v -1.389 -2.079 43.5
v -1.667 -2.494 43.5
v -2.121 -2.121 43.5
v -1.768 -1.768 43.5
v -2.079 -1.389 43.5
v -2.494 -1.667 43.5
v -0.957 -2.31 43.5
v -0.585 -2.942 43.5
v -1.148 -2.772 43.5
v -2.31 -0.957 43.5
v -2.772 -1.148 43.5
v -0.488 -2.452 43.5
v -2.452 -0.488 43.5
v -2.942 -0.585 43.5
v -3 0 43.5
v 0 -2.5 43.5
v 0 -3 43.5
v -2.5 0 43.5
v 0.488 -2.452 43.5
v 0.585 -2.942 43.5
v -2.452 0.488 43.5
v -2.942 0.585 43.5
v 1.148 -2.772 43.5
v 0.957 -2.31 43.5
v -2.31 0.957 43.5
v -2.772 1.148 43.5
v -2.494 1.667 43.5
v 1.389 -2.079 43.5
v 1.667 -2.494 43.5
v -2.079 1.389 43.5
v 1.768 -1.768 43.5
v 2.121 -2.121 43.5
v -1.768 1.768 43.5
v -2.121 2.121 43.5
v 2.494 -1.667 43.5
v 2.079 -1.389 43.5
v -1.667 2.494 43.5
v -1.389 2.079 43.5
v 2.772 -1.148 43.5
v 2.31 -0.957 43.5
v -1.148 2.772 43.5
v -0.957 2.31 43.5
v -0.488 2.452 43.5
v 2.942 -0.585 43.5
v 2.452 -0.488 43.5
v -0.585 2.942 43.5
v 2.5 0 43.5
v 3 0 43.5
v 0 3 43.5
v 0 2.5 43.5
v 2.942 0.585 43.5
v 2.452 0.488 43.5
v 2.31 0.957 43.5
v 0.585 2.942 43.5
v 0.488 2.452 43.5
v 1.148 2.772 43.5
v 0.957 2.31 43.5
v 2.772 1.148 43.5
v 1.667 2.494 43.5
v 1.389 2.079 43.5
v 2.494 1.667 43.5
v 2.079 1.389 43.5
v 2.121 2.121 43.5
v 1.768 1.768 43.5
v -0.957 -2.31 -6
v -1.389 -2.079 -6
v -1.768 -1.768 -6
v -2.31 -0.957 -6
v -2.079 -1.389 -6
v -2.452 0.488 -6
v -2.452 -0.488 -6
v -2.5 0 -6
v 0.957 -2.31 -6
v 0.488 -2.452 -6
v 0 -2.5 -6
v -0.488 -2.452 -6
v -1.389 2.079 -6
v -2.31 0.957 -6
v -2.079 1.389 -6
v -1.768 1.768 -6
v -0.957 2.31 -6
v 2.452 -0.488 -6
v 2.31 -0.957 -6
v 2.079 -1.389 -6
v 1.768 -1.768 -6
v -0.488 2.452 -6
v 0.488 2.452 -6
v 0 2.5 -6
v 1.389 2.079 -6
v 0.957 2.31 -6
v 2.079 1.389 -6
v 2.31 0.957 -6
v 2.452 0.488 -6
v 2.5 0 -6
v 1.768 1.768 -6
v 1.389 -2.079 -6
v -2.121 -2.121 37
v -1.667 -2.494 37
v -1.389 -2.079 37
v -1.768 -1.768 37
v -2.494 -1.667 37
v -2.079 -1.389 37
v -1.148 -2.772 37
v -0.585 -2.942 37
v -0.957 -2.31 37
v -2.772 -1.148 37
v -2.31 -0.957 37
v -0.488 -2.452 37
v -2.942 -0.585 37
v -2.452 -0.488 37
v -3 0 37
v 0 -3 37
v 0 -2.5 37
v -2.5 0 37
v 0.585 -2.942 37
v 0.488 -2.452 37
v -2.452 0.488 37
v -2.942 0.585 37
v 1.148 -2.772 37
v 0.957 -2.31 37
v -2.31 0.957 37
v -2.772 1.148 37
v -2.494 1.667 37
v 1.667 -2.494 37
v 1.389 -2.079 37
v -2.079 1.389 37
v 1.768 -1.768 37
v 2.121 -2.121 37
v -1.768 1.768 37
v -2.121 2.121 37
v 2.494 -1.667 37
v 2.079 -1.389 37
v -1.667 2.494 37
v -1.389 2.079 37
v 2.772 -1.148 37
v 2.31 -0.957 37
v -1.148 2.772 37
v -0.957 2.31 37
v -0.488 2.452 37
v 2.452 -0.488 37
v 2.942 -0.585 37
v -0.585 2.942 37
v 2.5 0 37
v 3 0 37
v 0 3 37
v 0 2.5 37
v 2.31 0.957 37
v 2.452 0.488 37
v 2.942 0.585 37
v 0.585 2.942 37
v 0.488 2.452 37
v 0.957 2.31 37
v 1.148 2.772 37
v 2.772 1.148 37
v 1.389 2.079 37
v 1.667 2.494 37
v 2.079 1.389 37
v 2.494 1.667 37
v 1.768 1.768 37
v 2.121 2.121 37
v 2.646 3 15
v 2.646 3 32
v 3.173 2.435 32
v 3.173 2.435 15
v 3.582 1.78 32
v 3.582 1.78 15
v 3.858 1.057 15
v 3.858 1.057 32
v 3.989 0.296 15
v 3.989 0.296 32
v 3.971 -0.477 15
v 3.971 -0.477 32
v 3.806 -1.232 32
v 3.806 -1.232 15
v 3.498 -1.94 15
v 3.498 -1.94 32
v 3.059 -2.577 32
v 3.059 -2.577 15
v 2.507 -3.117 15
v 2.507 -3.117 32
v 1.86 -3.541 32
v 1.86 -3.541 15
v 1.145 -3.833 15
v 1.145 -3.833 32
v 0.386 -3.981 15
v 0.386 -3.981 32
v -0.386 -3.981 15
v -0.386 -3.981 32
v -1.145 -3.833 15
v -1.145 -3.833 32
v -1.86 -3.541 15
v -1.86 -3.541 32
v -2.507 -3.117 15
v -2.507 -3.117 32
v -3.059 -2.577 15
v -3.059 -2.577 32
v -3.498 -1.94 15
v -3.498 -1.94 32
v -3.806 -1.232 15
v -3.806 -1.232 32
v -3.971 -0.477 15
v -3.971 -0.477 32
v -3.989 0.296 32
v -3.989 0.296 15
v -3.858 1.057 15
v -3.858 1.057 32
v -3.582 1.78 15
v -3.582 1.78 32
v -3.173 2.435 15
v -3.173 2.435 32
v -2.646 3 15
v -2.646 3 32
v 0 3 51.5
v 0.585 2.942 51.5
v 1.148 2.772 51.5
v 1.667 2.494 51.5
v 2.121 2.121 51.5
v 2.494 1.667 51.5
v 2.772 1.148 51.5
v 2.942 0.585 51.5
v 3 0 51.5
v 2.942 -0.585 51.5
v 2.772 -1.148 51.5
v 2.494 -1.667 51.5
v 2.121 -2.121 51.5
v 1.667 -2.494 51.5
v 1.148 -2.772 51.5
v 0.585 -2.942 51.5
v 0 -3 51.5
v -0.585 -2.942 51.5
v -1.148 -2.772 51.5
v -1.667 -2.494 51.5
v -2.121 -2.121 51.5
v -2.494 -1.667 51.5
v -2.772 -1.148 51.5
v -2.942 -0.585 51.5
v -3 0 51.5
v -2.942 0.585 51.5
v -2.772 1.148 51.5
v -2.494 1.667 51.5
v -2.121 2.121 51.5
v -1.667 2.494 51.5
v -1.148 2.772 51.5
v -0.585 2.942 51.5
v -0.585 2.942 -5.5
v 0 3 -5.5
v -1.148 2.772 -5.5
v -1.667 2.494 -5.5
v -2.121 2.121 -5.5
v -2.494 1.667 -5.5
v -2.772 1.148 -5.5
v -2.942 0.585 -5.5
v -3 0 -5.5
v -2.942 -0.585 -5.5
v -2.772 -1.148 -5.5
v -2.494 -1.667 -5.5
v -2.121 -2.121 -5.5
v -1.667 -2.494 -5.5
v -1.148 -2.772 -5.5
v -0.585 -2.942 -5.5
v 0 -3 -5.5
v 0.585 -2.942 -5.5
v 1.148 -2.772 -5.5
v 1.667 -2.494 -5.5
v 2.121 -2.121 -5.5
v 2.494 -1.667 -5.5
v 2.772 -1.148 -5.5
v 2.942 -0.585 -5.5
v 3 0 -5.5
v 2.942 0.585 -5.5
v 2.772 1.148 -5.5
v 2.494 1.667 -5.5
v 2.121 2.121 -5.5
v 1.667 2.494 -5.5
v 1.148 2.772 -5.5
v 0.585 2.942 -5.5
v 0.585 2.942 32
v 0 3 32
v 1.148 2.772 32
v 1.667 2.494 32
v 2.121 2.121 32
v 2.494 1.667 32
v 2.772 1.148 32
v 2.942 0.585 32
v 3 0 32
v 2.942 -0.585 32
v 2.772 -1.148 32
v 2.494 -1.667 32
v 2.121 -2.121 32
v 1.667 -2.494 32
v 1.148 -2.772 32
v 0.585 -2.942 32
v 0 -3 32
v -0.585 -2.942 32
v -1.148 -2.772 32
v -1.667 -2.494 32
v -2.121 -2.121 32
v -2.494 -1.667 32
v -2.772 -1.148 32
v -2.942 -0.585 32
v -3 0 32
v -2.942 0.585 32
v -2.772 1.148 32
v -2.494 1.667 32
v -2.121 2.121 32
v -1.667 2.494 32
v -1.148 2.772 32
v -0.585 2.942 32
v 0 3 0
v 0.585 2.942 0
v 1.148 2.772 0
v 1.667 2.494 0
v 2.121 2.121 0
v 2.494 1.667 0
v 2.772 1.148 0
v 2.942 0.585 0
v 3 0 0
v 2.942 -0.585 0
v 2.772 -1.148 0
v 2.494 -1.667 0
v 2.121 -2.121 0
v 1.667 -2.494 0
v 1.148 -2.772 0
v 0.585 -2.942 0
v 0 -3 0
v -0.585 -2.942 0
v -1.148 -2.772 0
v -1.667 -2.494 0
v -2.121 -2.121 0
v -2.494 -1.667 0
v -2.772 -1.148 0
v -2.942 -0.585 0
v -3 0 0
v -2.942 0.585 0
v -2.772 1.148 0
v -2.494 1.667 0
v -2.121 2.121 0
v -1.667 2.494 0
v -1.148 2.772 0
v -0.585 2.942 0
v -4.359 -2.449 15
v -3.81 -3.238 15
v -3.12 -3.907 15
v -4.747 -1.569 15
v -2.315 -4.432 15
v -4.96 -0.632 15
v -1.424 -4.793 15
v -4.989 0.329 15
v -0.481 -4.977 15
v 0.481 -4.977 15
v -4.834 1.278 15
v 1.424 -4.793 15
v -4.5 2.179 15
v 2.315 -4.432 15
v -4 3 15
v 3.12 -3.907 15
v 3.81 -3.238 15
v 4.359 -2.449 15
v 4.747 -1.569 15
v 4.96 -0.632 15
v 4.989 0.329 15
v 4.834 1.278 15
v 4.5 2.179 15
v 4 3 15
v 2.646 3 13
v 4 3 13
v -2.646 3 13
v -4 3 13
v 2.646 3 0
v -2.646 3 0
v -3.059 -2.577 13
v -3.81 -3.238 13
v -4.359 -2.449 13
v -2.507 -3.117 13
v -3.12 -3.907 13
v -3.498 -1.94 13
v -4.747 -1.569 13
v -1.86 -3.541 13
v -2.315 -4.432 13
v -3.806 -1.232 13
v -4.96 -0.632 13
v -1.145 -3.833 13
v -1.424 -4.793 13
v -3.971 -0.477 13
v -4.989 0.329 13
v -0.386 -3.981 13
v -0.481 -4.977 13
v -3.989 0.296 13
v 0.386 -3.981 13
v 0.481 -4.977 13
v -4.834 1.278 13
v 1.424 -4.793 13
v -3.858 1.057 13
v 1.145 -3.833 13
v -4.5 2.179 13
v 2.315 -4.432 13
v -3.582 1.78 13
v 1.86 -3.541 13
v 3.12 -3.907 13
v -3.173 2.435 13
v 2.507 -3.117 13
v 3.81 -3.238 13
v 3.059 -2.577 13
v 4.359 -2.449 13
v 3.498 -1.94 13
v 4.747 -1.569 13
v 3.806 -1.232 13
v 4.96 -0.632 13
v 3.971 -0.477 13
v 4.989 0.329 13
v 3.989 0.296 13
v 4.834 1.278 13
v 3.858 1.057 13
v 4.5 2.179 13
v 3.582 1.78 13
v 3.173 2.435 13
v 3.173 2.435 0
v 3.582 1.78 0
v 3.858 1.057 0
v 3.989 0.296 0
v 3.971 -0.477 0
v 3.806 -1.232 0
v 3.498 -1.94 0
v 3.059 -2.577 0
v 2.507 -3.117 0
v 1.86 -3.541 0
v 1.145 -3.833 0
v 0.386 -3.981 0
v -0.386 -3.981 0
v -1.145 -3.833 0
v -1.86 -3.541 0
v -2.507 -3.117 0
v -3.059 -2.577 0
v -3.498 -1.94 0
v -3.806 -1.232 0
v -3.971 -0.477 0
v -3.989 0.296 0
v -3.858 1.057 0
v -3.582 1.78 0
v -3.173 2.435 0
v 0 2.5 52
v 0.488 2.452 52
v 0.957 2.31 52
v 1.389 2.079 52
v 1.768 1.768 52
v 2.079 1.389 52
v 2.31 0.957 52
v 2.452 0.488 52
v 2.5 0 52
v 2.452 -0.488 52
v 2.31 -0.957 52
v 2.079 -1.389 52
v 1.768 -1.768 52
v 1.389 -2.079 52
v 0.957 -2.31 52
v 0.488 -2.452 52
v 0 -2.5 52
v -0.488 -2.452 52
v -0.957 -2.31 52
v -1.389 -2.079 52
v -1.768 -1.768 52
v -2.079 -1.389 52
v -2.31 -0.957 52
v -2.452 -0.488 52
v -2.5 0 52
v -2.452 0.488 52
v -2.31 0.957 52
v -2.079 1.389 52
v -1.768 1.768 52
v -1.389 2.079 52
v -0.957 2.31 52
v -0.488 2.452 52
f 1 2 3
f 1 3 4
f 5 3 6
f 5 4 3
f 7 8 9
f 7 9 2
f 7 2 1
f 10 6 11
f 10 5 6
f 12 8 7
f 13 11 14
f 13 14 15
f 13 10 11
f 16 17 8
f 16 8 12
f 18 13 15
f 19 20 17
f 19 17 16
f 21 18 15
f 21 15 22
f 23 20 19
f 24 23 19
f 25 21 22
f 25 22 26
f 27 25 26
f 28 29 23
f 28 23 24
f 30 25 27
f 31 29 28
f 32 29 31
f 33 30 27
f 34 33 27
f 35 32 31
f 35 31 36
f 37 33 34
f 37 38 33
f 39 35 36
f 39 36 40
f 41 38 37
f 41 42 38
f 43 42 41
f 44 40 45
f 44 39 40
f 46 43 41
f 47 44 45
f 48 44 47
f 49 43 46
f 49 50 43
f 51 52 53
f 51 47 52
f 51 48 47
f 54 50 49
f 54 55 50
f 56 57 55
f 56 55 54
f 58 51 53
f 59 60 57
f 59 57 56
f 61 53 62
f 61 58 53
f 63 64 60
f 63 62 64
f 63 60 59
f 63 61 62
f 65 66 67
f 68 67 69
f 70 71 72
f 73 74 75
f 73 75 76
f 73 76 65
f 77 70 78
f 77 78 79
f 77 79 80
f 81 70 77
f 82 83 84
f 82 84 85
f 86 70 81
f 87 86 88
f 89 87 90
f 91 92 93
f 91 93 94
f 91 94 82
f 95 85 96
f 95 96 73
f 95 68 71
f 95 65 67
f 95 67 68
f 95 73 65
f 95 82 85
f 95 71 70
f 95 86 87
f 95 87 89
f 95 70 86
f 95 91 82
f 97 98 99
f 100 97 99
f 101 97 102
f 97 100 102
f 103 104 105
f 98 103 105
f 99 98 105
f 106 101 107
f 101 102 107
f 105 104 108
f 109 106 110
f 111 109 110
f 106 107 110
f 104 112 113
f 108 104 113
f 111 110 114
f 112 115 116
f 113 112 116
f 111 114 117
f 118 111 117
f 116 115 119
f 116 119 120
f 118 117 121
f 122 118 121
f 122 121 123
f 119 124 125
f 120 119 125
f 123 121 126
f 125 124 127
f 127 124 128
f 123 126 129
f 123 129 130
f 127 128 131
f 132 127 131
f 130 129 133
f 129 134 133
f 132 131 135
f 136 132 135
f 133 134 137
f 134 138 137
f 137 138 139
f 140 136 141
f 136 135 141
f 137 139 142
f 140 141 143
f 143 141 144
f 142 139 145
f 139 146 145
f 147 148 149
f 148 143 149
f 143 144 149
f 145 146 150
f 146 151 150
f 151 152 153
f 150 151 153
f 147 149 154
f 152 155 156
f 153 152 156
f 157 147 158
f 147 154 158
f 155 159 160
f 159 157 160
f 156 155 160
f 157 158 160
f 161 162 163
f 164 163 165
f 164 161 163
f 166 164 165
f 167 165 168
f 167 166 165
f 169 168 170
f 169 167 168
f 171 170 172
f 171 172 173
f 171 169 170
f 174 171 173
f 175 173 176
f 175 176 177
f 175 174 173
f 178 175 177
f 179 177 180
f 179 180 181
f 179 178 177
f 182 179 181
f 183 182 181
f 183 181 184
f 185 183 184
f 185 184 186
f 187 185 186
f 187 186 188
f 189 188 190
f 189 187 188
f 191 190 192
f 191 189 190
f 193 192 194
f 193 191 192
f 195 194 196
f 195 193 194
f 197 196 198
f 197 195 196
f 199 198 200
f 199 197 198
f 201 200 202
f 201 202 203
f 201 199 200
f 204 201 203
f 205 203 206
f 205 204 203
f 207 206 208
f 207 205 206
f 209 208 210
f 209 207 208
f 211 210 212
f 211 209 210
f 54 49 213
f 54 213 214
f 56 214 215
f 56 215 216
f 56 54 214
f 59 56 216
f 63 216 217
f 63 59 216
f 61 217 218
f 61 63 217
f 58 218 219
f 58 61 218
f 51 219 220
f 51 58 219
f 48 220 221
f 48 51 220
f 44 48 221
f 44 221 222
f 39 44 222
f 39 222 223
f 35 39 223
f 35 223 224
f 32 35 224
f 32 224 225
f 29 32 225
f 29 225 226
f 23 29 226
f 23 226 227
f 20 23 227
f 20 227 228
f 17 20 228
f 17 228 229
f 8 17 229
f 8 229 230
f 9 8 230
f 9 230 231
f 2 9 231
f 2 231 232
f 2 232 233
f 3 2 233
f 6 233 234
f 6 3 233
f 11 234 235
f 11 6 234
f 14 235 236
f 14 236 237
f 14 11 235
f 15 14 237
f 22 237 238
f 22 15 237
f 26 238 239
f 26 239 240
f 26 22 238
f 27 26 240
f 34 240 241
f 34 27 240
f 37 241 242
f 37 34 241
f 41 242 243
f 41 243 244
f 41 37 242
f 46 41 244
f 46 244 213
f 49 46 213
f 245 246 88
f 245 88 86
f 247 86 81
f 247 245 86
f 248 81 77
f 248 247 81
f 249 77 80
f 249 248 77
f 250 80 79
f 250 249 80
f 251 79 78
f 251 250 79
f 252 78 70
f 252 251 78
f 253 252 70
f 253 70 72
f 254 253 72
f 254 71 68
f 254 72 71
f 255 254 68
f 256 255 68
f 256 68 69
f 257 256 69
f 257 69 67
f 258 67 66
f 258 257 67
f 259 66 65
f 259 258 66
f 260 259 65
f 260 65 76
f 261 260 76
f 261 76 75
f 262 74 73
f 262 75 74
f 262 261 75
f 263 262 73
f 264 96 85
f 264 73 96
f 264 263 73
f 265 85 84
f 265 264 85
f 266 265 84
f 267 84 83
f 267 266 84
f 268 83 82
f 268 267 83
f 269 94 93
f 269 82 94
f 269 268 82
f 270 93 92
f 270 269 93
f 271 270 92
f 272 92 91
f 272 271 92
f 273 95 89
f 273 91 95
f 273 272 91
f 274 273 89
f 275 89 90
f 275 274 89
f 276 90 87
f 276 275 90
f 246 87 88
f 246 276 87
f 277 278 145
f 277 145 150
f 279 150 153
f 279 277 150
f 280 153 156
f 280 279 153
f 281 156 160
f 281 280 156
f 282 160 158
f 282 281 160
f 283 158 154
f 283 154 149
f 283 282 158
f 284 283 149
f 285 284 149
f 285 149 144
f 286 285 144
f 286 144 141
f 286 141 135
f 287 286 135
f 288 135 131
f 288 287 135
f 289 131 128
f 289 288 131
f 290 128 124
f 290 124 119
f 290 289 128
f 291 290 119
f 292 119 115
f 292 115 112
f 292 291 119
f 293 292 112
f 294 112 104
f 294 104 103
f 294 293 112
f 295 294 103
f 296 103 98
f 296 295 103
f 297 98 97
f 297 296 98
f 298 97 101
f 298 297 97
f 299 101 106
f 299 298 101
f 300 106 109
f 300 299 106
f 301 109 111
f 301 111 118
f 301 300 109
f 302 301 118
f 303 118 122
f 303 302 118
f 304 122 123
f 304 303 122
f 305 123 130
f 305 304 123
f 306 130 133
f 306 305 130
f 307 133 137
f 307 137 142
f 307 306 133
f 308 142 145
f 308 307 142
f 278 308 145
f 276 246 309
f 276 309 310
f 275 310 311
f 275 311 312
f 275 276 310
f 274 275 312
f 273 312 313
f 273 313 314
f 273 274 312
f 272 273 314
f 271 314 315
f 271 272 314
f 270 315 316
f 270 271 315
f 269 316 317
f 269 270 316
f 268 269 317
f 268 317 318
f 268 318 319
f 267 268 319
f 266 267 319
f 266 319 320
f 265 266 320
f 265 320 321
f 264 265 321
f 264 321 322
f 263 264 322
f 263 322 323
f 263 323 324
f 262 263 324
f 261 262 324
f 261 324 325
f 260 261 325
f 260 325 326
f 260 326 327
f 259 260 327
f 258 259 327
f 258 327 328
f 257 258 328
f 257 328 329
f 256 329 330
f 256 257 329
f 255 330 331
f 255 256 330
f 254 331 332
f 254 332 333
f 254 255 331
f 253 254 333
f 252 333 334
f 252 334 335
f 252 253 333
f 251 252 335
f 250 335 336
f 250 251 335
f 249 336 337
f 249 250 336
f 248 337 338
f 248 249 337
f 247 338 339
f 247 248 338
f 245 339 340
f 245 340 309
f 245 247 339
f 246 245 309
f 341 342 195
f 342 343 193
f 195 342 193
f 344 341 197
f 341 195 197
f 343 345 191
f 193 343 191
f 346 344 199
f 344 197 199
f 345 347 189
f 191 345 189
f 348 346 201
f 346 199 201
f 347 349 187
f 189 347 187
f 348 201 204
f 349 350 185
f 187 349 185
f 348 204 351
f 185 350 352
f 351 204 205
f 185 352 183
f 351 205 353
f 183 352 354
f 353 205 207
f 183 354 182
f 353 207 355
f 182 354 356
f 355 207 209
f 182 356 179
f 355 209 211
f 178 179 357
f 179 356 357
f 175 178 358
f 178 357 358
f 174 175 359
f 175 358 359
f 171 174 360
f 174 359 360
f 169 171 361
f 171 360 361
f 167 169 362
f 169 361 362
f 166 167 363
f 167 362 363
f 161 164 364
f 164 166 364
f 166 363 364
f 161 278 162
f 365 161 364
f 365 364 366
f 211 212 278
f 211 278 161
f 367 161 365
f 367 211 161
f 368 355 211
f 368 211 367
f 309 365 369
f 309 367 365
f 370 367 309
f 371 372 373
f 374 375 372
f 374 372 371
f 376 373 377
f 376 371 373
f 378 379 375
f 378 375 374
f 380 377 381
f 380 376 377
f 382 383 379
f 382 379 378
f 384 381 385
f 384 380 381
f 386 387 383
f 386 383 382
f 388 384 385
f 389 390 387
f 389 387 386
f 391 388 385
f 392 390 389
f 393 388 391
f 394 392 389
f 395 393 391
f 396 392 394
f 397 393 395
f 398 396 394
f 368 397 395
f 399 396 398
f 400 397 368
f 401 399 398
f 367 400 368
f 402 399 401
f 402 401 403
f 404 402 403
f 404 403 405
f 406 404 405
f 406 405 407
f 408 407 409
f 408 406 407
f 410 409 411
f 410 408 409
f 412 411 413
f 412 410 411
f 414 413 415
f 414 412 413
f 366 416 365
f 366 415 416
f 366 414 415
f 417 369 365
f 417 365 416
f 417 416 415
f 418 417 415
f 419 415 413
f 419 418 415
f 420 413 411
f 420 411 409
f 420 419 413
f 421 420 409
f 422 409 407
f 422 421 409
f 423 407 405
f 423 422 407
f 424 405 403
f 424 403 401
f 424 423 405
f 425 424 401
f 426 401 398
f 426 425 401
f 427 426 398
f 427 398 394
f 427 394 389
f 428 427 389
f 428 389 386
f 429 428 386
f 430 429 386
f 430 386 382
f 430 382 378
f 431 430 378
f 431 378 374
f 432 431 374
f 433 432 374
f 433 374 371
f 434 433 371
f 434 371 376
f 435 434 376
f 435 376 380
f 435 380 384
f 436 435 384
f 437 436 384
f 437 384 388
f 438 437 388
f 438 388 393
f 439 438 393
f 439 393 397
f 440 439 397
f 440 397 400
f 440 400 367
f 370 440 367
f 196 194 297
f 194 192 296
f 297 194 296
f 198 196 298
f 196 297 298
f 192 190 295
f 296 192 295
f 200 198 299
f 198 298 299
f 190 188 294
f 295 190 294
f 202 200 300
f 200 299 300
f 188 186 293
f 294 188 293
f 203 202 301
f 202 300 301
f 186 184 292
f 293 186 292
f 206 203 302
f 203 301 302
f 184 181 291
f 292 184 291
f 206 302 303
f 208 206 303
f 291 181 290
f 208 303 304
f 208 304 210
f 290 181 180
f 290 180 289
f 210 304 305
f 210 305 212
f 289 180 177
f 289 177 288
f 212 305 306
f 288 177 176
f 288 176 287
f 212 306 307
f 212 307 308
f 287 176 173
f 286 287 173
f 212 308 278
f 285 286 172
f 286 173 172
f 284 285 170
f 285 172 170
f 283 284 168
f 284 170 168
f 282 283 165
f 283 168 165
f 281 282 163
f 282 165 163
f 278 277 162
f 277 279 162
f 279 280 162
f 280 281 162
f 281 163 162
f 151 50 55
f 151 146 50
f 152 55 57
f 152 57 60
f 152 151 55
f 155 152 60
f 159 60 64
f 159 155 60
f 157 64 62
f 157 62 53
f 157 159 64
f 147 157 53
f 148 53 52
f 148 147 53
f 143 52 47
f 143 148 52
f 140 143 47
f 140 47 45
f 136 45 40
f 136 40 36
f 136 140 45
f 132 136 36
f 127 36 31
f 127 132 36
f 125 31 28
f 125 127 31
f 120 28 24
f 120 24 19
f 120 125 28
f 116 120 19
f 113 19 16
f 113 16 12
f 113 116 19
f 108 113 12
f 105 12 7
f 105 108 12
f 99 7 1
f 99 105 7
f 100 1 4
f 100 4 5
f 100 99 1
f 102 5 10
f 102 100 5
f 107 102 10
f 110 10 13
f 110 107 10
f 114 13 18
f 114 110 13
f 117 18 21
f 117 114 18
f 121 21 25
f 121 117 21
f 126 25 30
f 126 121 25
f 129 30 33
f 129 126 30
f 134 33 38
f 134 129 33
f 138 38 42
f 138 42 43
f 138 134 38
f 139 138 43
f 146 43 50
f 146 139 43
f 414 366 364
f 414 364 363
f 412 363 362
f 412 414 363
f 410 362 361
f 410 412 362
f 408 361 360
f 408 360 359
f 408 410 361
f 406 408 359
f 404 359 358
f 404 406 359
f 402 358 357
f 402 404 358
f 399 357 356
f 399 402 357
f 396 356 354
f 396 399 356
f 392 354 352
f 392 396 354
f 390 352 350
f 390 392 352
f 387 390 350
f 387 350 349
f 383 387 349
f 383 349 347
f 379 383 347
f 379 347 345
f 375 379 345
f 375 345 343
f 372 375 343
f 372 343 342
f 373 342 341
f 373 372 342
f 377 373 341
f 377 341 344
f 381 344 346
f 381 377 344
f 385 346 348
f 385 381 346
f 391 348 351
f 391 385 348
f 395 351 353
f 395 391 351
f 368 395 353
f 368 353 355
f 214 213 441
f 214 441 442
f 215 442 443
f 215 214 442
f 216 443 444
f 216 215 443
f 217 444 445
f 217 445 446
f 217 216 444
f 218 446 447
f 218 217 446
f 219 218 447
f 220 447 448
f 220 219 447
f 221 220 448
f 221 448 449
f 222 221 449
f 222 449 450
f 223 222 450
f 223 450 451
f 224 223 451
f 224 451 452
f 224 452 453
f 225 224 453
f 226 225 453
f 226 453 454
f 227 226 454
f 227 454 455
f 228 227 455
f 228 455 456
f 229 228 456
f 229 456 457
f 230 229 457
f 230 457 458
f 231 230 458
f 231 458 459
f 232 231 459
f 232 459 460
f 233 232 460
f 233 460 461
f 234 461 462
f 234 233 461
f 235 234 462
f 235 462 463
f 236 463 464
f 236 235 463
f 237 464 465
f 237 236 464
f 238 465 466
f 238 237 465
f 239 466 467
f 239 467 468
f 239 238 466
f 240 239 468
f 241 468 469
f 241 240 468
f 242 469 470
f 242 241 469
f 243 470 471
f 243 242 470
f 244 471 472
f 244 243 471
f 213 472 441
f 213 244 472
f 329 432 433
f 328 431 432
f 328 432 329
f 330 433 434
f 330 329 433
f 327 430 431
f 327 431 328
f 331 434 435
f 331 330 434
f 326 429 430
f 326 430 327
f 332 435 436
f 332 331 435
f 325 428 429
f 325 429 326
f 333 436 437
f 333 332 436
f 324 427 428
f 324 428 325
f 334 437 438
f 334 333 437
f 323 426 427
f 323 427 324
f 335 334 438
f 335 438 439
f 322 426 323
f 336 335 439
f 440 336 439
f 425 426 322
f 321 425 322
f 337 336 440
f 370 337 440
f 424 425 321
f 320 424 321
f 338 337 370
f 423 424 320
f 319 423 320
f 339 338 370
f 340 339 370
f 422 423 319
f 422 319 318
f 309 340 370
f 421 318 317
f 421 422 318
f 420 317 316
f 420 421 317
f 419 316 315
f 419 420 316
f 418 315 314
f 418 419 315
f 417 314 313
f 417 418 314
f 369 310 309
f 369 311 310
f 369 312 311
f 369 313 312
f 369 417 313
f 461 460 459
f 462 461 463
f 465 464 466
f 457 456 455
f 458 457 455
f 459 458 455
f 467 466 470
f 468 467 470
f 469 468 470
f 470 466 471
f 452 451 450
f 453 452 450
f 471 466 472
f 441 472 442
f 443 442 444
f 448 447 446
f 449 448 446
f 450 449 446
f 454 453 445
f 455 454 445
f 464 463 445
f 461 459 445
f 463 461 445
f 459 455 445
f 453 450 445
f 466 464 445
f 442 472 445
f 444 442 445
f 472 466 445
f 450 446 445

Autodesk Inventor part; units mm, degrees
ref_plane "YZ Plane" through (0, 0, 0) normal (1, 0, 0) x (0, 1, 0)
ref_plane "XZ Plane" through (0, 0, 0) normal (0, 1, 0) x (-1, 0, 0)
ref_plane "XY Plane" through (0, 0, 0) normal (0, 0, 1) x (1, 0, 0)
sketch "Esquisse1" plane through (0, 0, 0) normal (1, 0, 0) x (0, 1, 0)
  line L0 (0, 52) -> (3, 52)
  line L1 (3, 32) -> (4, 32)
  line L2 (4, 32) -> (4, 15)
  line L3 (4, 0) -> (3, 0)
  line L4 (3, 0) -> (3, -6)
  line L5 (3, -6) -> (0, -6)
  line L6 (0, 64.5811) -> (0, -64.5811)
  line L7 (4, 15) -> (5, 15)
  line L8 (5, 15) -> (5, 13)
  line L9 (5, 13) -> (4, 13)
  line L10 (4, 13) -> (4, 0)
  line L11 (3, 43.5) -> (2.5, 43.5)
  line L12 (2.5, 43.5) -> (2.5, 37)
  line L13 (2.5, 37) -> (3, 37)
  line L14 (3, 37) -> (3, 43.5) construction
  line L15 (3, 52) -> (3, 43.5)
  line L16 (3, 37) -> (3, 32)
  point P0 (0, 0)
  dimension "d1" = 6
  dimension "d3" = 8
  dimension "d4" = 2
  dimension "d5" = 10
  dimension "d6" = 13
  dimension "d7" = 17
  dimension "d8" = 20
  dimension "d9" = 6
  dimension "d16" = 0.5
  dimension "d17" = 8.5
  dimension "d18" = 5
revolve "Révolution1" add sketch "Esquisse1" angle 360 about axis through (0, 0, 64.5811) along (0, 0, -1)
sketch "Esquisse2" plane through (0, 0, 0) normal (1, 0, 0) x (0, 1, 0)
  line L0 (7, 32) -> (3, 32)
  line L1 (3, 32) -> (3, 0)
  line L2 (3, 0) -> (7, 0)
  line L3 (7, 0) -> (7, 32)
  line L4 (-4, 0) -> (4, 0) projected
  line L5 (-4, 32) -> (4, 32) projected
  point P0 (0, 0)
  point P1 (0, 0)
  dimension "d11" = 3
  dimension "d12" = 4
extrude "Extrusion1" cut sketch "Esquisse2" along normal through all both and the other way through all
chamfer "Chanfrein1" distance 0.5 angle 45 2 edges at (0, -3, 52) (0, -3, -6)
properties part number "arbre_roue"
